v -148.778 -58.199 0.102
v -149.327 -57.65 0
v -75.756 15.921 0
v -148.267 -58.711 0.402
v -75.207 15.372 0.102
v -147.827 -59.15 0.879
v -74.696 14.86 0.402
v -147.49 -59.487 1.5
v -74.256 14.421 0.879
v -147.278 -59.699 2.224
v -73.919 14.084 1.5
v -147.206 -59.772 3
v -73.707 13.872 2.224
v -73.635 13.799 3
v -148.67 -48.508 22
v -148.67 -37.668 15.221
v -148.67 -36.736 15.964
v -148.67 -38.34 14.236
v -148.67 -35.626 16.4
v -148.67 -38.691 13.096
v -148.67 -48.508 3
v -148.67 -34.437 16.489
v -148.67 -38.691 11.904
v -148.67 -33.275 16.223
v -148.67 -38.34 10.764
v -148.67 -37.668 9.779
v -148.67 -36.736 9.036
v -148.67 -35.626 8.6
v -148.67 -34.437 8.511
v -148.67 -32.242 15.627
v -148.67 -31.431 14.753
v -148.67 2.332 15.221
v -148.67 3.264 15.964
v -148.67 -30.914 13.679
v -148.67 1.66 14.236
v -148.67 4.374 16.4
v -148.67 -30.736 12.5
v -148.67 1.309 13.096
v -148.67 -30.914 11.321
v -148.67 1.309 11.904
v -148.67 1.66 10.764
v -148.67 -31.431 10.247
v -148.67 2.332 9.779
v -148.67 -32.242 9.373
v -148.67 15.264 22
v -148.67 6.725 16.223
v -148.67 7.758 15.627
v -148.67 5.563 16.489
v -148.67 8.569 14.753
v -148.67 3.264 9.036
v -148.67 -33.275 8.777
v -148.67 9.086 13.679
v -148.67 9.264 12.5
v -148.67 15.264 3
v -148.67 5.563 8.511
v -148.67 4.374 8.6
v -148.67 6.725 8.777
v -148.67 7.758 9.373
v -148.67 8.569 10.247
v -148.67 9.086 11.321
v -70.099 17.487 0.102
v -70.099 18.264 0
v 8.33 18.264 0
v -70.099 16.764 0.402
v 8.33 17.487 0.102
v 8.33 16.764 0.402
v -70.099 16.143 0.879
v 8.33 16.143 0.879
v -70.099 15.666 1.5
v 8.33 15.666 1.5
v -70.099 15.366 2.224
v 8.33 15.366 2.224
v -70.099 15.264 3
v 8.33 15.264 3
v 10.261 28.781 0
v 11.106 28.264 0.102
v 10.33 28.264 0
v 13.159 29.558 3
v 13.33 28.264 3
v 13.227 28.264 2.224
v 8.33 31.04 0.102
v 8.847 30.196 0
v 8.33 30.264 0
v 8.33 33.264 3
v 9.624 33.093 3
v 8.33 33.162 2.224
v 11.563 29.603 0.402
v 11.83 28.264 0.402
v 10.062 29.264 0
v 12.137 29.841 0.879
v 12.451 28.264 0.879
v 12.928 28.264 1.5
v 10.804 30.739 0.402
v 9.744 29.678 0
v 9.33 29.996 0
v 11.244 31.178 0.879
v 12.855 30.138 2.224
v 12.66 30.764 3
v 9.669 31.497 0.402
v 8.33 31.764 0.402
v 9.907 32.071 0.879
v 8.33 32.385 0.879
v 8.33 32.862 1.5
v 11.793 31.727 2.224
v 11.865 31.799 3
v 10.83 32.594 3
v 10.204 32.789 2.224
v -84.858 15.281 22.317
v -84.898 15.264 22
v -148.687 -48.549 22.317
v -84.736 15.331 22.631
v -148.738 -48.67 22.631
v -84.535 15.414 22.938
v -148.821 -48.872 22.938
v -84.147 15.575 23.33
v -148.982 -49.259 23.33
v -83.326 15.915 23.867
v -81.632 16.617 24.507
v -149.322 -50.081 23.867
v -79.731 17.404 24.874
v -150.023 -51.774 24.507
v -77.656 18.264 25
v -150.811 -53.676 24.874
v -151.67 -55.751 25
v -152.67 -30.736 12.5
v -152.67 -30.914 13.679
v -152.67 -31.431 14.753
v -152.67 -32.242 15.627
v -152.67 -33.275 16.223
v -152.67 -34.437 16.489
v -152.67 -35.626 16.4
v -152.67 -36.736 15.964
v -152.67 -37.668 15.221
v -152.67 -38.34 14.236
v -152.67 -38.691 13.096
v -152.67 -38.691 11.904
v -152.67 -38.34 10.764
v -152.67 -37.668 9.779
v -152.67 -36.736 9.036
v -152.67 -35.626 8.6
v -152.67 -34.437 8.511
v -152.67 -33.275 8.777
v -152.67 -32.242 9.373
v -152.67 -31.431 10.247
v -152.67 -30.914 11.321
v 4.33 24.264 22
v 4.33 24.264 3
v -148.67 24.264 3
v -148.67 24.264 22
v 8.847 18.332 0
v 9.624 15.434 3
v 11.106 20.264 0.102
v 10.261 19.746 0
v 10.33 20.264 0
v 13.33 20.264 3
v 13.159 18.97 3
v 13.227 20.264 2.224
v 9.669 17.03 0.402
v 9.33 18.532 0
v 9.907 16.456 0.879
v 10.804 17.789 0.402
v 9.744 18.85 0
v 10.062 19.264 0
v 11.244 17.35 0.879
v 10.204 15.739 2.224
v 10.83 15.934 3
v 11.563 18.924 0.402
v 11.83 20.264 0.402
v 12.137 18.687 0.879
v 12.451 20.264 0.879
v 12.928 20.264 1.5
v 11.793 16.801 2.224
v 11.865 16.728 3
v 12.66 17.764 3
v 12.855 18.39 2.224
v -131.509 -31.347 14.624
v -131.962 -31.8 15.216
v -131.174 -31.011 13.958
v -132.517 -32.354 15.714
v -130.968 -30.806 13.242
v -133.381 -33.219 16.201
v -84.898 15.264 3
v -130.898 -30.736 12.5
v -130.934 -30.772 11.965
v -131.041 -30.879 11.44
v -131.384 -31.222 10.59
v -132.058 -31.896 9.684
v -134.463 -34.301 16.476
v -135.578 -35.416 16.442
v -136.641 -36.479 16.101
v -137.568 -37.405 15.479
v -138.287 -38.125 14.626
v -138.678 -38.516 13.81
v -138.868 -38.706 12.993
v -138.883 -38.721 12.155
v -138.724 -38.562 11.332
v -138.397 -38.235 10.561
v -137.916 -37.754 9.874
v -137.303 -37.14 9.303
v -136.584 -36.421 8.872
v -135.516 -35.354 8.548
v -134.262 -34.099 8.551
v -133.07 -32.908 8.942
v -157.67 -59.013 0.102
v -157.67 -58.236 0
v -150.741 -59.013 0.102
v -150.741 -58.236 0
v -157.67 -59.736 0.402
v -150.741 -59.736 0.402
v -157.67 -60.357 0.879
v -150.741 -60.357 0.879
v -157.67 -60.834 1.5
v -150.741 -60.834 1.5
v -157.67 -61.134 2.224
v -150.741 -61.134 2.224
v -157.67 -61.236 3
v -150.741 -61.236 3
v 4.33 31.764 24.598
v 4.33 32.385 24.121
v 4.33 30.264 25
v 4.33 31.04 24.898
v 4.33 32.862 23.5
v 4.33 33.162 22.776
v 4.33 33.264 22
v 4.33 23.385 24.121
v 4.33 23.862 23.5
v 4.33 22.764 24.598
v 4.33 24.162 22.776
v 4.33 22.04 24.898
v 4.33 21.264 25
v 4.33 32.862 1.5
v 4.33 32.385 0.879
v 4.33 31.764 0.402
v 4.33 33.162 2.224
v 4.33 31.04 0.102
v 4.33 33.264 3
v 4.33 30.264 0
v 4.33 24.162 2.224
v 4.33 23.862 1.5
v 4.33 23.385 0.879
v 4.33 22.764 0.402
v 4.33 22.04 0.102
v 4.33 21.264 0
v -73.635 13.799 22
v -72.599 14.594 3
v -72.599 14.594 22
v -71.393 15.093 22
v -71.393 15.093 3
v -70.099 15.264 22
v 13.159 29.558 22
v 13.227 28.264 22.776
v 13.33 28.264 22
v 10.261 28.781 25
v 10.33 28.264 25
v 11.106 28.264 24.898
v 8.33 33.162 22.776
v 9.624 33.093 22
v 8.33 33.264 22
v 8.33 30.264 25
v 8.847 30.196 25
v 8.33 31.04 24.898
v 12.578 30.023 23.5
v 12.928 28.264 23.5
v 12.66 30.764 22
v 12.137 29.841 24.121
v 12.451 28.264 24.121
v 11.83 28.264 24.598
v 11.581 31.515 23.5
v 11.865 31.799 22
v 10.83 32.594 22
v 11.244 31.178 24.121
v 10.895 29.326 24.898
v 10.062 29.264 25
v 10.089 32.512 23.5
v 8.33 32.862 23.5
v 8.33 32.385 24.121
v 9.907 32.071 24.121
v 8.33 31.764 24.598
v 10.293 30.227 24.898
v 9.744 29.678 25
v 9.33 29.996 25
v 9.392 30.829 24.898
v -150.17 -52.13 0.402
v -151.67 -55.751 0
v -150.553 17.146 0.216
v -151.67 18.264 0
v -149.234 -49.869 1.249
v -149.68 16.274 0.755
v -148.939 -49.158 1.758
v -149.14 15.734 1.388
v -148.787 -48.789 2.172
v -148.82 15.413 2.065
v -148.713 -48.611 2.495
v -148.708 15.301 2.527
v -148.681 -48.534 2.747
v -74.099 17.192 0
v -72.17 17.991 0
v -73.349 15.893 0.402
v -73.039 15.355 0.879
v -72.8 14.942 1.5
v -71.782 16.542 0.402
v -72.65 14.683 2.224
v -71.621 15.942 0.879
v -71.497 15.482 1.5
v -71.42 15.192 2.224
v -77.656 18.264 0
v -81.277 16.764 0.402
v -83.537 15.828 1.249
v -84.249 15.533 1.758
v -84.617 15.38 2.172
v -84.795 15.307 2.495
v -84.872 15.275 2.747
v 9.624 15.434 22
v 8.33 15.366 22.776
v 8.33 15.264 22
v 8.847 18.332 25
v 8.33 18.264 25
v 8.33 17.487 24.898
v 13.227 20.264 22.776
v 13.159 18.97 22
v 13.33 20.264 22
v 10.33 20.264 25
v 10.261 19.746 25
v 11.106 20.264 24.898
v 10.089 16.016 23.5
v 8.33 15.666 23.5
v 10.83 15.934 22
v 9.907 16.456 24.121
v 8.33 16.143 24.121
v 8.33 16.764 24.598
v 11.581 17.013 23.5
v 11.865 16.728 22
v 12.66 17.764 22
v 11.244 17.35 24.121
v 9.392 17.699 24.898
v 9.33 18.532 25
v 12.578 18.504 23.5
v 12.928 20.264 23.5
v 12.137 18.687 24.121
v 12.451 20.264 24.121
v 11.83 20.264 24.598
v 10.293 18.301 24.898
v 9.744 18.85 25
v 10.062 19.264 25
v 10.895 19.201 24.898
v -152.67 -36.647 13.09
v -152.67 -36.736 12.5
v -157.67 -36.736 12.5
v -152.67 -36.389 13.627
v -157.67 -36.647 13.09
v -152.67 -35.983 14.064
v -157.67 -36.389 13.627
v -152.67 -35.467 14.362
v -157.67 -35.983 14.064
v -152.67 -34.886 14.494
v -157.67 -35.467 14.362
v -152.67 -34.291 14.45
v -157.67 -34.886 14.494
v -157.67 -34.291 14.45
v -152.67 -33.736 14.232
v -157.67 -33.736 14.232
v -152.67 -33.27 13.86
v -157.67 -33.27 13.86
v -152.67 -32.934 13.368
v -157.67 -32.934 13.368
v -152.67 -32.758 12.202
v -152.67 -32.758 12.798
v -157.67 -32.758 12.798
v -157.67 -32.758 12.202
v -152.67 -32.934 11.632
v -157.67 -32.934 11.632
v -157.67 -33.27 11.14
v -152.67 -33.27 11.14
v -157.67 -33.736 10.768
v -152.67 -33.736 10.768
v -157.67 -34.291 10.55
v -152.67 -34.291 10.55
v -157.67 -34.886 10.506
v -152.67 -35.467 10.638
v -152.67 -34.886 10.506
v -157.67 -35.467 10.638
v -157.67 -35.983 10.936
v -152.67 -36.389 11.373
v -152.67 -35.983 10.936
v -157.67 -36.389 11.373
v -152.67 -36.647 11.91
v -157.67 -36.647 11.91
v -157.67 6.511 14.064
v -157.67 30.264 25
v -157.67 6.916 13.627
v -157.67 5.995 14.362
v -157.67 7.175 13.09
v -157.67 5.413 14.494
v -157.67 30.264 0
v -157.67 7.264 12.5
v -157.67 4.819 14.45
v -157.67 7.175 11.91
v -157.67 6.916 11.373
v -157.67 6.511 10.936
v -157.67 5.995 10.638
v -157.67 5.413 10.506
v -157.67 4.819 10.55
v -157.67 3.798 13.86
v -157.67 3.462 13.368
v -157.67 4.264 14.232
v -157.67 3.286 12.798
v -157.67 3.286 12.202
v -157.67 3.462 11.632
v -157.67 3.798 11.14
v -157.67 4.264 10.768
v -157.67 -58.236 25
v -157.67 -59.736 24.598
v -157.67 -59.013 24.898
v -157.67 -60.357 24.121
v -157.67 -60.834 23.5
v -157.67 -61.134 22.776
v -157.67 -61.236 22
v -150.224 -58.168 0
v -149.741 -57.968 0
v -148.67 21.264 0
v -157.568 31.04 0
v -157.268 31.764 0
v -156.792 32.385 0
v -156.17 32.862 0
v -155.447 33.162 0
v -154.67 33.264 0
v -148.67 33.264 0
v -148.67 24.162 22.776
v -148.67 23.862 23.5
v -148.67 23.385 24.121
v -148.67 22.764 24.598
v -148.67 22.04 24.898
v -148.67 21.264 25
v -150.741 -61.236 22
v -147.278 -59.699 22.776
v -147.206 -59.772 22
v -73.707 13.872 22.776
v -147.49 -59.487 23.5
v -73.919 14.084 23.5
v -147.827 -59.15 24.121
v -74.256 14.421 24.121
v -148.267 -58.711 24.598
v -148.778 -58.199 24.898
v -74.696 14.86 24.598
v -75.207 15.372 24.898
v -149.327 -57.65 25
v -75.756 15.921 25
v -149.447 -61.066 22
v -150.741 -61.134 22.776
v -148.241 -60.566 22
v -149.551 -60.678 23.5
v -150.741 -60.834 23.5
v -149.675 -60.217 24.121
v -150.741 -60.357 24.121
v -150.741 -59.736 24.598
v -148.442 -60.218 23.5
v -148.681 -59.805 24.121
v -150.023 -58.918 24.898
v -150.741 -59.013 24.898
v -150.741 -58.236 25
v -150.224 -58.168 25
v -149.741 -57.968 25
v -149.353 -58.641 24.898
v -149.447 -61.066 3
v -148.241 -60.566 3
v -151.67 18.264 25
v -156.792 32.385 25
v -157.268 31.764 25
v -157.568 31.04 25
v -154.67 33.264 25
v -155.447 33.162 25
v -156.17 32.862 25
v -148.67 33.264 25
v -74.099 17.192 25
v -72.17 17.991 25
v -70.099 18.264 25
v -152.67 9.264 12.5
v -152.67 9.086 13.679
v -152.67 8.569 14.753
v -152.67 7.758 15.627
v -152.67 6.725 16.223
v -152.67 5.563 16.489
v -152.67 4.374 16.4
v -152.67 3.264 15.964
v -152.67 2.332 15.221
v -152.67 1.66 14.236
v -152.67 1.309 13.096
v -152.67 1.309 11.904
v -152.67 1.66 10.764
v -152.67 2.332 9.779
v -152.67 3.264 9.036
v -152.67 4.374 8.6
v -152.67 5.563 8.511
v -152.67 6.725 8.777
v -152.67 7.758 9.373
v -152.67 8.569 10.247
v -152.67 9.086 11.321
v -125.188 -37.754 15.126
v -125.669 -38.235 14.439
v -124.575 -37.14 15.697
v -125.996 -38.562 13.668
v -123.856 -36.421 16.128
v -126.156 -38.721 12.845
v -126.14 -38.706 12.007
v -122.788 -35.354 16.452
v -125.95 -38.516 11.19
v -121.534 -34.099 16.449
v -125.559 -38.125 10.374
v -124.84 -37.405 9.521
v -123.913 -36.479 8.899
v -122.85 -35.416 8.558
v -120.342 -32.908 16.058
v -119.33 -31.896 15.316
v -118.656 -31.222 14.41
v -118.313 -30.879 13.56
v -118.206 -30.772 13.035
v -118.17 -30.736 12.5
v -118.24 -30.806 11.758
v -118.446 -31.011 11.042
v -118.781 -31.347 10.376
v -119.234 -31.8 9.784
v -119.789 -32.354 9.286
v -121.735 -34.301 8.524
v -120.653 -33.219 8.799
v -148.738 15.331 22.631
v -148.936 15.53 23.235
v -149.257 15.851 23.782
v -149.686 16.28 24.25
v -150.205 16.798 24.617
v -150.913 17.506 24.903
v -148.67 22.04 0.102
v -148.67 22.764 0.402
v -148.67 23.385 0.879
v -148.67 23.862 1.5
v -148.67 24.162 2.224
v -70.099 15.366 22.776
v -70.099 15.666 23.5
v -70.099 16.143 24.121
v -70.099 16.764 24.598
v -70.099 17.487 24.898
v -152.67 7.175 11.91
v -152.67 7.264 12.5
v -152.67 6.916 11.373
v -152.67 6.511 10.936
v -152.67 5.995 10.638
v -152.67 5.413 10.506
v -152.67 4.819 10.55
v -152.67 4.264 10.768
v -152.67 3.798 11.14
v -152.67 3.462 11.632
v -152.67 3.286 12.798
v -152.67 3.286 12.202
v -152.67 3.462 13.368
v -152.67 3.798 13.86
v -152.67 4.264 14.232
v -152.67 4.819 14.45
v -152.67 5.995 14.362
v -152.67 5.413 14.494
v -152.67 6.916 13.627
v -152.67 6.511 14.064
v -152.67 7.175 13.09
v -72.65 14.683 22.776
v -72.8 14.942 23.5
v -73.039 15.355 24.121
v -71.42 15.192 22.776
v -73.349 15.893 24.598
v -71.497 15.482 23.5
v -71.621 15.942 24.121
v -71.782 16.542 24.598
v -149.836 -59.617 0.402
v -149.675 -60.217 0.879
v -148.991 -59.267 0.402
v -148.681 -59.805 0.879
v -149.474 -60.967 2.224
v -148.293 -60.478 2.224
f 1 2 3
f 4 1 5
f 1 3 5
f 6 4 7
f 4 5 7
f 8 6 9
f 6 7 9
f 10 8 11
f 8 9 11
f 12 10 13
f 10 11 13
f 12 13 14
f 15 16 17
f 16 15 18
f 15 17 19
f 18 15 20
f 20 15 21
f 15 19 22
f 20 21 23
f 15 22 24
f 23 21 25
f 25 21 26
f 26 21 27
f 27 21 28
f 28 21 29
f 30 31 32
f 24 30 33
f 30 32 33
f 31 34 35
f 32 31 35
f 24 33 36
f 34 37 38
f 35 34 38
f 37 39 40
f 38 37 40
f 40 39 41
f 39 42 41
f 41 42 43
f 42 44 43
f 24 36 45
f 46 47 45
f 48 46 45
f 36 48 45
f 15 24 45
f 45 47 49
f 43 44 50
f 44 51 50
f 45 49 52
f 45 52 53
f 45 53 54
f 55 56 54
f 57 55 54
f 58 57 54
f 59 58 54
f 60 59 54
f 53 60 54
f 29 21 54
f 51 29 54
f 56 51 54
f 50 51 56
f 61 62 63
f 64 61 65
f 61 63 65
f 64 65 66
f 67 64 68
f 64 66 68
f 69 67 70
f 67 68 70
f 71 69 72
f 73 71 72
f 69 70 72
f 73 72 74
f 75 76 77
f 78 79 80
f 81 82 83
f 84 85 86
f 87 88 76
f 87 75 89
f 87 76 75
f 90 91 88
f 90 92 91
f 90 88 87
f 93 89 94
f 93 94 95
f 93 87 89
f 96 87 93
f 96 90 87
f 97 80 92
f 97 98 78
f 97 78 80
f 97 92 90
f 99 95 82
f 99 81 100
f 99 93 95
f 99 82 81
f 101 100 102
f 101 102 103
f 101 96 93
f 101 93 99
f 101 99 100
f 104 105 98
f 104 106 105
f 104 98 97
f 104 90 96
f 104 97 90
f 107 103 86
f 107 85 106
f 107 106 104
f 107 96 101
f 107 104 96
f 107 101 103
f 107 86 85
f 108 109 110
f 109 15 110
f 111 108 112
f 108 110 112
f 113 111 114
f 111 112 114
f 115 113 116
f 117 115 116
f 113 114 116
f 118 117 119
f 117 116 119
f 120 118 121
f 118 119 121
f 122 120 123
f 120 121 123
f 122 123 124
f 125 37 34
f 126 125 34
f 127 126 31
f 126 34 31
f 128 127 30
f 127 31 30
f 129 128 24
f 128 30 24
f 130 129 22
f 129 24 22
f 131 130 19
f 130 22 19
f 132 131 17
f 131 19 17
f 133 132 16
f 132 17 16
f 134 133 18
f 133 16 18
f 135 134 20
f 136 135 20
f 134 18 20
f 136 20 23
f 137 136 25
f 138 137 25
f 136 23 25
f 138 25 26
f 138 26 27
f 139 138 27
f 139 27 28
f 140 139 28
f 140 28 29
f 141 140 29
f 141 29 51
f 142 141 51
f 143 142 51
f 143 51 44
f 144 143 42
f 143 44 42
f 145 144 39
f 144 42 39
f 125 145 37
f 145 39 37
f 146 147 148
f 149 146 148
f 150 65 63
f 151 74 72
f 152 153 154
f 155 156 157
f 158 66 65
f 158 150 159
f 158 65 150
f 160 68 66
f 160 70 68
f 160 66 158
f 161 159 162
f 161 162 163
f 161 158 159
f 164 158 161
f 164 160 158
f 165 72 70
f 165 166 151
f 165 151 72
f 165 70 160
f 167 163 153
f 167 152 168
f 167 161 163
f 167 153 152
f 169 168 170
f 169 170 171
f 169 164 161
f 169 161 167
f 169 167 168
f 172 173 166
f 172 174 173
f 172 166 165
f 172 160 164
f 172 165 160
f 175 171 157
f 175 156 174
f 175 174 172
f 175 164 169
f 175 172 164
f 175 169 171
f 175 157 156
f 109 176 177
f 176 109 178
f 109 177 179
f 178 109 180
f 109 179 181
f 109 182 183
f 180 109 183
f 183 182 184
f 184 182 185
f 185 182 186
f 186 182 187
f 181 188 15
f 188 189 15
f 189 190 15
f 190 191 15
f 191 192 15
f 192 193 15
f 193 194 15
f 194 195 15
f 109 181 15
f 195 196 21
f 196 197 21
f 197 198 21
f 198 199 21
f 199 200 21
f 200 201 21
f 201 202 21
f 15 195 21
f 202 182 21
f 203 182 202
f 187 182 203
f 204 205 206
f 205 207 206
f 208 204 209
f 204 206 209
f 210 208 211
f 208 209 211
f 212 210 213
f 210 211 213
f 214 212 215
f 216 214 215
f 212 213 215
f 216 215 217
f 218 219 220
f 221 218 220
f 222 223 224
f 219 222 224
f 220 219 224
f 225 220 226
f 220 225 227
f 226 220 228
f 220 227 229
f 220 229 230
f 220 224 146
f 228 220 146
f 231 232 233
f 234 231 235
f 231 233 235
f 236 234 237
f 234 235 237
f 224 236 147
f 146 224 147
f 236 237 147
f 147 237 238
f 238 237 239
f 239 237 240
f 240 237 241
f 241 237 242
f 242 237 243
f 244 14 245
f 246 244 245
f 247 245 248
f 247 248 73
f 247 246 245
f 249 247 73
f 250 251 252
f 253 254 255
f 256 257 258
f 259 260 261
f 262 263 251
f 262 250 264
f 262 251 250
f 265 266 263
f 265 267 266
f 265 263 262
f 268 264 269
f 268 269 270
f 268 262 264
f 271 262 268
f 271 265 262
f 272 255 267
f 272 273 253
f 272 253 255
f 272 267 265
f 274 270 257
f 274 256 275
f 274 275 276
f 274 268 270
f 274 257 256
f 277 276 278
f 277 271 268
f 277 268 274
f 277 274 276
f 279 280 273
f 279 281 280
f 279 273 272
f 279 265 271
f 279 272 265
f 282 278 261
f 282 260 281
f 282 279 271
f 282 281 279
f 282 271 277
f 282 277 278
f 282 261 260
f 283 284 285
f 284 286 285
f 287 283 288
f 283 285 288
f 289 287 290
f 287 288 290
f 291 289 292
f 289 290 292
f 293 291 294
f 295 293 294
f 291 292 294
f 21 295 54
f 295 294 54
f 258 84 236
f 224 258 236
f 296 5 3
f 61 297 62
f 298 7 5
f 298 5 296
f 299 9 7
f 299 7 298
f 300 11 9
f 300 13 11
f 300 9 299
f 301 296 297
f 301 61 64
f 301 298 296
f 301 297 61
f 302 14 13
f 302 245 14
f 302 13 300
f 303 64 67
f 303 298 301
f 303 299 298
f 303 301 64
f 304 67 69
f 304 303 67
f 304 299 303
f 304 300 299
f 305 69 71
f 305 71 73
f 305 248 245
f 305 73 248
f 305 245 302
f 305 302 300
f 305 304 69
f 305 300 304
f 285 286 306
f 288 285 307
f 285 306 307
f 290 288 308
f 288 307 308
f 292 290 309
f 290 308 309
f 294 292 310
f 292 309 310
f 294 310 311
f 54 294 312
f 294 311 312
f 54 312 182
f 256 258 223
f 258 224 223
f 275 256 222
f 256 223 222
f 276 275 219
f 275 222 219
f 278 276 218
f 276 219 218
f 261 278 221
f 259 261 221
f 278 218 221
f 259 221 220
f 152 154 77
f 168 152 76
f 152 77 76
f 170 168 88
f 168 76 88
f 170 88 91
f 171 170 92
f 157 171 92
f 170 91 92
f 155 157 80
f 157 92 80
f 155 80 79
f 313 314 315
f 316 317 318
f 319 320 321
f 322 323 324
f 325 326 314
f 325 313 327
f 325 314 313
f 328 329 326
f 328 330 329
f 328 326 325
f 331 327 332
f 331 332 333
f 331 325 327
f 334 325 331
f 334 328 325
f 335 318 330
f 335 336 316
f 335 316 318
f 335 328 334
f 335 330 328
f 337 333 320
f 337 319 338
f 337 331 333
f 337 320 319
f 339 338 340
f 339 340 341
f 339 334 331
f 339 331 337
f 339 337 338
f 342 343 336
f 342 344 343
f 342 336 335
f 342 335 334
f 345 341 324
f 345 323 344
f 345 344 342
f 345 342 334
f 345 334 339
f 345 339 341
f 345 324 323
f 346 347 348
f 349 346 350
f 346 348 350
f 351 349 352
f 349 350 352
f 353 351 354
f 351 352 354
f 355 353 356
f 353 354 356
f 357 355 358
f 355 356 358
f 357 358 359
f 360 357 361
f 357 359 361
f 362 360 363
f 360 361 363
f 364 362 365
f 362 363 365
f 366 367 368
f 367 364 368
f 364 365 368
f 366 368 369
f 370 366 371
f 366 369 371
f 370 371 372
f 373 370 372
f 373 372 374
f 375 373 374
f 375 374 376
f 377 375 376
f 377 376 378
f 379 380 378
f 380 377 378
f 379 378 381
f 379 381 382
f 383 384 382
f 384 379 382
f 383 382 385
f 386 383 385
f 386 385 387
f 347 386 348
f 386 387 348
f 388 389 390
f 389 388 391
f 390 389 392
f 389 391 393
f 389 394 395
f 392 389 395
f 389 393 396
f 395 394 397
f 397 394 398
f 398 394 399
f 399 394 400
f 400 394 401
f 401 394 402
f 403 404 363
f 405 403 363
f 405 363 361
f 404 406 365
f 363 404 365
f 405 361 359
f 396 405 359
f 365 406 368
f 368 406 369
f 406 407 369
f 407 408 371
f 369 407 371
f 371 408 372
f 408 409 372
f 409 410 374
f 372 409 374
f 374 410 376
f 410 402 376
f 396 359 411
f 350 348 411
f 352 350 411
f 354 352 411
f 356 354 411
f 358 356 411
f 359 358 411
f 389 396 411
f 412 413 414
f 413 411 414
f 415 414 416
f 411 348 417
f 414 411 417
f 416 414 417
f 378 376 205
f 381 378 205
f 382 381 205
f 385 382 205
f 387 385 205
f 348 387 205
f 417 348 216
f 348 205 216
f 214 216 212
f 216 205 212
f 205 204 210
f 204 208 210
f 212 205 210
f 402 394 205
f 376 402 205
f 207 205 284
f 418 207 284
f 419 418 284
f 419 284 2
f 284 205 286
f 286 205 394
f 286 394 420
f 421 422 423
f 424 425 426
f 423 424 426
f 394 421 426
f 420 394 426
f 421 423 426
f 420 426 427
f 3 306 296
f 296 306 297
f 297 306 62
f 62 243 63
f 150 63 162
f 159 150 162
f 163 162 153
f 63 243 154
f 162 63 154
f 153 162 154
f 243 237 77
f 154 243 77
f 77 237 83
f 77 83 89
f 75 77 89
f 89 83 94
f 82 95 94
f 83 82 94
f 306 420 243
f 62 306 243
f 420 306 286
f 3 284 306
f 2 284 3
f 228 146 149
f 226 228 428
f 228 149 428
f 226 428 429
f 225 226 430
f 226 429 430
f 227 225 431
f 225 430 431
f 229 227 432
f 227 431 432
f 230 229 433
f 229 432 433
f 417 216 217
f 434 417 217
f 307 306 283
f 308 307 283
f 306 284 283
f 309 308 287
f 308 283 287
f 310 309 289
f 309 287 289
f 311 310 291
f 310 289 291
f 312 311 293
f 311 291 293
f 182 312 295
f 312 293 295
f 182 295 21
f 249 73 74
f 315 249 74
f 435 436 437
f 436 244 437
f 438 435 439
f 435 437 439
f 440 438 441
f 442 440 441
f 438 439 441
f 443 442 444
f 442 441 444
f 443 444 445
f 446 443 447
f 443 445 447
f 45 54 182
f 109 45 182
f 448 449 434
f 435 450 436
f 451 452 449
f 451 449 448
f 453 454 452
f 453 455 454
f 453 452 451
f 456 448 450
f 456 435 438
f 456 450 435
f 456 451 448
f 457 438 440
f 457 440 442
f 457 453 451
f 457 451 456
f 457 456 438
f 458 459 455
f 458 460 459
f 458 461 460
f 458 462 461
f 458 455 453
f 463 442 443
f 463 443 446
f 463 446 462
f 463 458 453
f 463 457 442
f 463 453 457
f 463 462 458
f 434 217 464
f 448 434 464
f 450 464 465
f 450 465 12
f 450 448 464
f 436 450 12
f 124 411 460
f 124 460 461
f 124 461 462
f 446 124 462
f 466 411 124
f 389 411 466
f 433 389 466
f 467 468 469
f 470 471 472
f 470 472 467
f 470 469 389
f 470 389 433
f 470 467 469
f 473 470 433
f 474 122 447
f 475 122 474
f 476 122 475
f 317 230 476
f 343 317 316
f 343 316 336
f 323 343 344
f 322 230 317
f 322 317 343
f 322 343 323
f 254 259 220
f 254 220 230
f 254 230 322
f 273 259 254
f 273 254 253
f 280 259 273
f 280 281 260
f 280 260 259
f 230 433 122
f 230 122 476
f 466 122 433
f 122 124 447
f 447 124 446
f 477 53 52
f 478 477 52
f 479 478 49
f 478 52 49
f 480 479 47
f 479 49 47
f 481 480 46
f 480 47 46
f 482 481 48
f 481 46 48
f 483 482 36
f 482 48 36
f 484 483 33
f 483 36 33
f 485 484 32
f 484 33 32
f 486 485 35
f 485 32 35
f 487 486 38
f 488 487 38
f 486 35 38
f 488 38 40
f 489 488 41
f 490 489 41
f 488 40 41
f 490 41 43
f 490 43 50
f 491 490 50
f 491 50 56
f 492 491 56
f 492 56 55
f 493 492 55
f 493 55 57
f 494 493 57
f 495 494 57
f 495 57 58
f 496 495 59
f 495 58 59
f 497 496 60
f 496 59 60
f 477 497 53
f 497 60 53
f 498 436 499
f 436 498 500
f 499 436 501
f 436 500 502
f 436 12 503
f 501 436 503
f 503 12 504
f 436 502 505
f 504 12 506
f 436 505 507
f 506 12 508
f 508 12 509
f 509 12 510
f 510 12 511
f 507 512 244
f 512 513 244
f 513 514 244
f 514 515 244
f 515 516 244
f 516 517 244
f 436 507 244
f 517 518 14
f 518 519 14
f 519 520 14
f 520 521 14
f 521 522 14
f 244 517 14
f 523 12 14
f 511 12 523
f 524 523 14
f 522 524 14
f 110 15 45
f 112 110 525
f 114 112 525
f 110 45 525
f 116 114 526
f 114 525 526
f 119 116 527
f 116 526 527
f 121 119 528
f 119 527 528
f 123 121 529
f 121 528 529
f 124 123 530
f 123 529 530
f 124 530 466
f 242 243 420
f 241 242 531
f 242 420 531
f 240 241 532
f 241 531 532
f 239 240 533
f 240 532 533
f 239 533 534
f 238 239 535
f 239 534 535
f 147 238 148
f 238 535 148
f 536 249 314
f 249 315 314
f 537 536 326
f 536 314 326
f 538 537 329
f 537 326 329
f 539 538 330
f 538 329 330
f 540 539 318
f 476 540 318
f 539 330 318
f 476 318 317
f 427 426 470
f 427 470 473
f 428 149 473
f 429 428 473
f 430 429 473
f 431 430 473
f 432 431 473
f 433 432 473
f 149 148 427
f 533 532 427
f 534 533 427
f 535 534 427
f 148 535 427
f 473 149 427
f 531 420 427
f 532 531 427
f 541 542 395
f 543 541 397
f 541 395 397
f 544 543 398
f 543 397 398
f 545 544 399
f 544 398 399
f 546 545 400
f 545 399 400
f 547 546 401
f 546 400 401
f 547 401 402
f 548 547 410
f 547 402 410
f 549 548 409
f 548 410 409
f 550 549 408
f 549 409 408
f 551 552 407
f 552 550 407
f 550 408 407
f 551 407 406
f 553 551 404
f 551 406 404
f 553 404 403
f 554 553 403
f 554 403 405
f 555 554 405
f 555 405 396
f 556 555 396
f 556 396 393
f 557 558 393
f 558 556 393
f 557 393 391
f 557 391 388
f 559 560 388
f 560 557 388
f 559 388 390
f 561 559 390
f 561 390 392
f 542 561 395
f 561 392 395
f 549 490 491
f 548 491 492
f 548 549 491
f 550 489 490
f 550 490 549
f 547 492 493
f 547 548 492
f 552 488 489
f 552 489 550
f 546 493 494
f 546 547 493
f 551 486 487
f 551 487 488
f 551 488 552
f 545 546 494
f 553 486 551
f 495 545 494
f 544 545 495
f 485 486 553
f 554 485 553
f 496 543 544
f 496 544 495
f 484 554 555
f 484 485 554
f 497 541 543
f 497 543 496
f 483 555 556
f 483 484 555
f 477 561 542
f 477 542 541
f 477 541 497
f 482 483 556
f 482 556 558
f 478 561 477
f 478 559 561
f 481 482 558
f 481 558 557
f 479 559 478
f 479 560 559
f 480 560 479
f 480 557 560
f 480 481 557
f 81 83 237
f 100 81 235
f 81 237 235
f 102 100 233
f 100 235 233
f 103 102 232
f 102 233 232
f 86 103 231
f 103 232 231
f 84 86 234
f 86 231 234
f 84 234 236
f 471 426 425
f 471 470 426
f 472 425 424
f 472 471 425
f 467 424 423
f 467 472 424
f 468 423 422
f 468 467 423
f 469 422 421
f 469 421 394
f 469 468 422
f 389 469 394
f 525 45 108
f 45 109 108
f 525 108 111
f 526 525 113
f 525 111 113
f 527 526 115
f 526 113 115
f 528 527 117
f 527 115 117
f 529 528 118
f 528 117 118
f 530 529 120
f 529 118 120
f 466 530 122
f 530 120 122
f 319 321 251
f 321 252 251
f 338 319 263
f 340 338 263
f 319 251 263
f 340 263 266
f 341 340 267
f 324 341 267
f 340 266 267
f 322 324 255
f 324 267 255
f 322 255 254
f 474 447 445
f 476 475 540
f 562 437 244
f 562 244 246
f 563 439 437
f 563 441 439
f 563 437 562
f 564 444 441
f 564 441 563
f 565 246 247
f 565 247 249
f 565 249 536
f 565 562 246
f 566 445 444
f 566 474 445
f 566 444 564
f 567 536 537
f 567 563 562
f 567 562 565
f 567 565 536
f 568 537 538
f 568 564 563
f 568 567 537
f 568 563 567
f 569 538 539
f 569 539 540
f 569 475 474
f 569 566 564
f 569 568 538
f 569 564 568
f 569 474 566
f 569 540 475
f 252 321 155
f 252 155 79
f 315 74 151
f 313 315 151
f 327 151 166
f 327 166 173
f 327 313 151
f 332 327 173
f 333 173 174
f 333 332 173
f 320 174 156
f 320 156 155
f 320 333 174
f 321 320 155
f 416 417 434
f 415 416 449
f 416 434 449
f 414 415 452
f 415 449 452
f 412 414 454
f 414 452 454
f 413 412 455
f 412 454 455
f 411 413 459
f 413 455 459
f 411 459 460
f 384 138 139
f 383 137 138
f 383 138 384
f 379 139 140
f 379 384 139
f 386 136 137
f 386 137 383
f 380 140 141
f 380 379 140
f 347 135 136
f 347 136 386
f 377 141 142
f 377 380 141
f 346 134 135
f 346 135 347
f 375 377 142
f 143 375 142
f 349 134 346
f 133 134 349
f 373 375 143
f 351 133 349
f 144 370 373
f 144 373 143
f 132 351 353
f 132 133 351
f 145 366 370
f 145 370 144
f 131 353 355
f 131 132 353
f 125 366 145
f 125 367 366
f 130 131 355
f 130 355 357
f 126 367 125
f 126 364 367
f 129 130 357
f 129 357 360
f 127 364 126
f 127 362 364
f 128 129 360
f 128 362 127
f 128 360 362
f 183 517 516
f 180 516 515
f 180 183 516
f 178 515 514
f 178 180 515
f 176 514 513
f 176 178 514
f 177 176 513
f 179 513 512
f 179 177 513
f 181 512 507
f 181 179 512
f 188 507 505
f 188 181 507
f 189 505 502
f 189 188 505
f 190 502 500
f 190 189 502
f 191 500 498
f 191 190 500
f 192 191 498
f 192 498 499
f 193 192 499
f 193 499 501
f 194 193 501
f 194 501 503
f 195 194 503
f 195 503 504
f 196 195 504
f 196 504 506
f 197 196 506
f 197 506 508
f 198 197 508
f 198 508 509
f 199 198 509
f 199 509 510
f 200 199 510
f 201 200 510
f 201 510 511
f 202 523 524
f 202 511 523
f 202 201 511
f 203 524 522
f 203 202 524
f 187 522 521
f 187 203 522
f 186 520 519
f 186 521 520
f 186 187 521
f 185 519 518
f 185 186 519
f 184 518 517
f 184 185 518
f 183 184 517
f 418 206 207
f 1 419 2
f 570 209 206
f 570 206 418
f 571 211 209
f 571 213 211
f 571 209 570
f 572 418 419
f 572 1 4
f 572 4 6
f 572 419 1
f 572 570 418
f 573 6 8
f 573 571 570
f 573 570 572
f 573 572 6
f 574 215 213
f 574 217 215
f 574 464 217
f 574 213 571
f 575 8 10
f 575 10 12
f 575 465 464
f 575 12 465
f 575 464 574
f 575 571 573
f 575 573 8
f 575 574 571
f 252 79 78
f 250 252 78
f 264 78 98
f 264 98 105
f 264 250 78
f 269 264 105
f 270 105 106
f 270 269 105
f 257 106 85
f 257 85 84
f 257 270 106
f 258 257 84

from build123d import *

# Parameters (mm, degrees)
F0_W     = 9
F0_H     = 9
F1_DEPTH = 25
F3_DEPTH = 9
F4_R     = 4
F4_R_2   = 2
F5_DEPTH = 4
F6_DEPTH = 162.001
F7_R     = 5
F8_R     = 5
F9_R     = 5
F10_R    = 5
F11_R    = 3
F12_R    = 3


with BuildPart() as f1:
    # F0 (on Top) → F1 (new body)
    with BuildSketch(Plane.XY):
        Polygon((-148.6704205513, 24.2638568878), (-148.6704205513, 15.2638568878), (-84.8983426127, 15.2638568878), (-72.1704205513, 15.2638568878), (4.3295794487, 15.2638568878), (4.3295794487, 24.2638568878), align=None)
        with Locations((-153.1704205513, 19.7638568878)):
            Rectangle(F0_W, F0_H)
        Polygon((-148.6704205513, -48.5082210508), (-148.6704205513, 15.2638568878), (-157.6704205513, 15.2638568878), (-157.6704205513, -61.2361431122), (-148.6704205513, -61.2361431122), align=None)
        Polygon((-72.1704205513, 15.2638568878), (-84.8983426127, 15.2638568878), (-116.784381582, -16.6221820815), (-110.4204205513, -22.9861431122), align=None)
        with Locations((-153.1704205513, 28.7638568878)):
            Rectangle(F0_W, F0_H)
        Polygon((-116.784381582, -16.6221820815), (-148.6704205513, -48.5082210508), (-148.6704205513, -61.2361431122), (-110.4204205513, -22.9861431122), align=None)
        Polygon((4.3295794487, 33.2638568878), (4.3295794487, 24.2638568878), (4.3295794487, 15.2638568878), (13.3295794487, 15.2638568878), (13.3295794487, 33.2638568878), align=None)
    extrude(amount=F1_DEPTH)

    # F2 (on face) → F3 (cut, through all)
    with BuildSketch(Plane(origin=(-157.6704205513, 0, 0), x_dir=(0, -1, 0), z_dir=(-1, 0, 0))):
        with BuildLine():
            ThreePointArc((-3.2638568878, 12.5), (-5.2638568878, 14.5), (-7.2638568878, 12.5))
            Line((-7.2638568878, 12.5), (-3.2638568878, 12.5))
        make_face()
        with BuildLine():
            Line((-3.2638568878, 12.5), (-7.2638568878, 12.5))
            ThreePointArc((-7.2638568878, 12.5), (-5.2638568878, 10.5), (-3.2638568878, 12.5))
        make_face()
        with BuildLine():
            ThreePointArc((32.7361431122, 12.5), (34.7361431122, 10.5), (36.7361431122, 12.5))
            Line((36.7361431122, 12.5), (32.7361431122, 12.5))
        make_face()
        with BuildLine():
            Line((32.7361431122, 12.5), (36.7361431122, 12.5))
            ThreePointArc((36.7361431122, 12.5), (34.7361431122, 14.5), (32.7361431122, 12.5))
        make_face()
    extrude(amount=-F3_DEPTH, mode=Mode.SUBTRACT)

    # F4 (on face) → F5 (cut)
    with BuildSketch(Plane.YZ.offset(-148.6704205513)):
        with Locations((5.2638568876, 12.5)):
            Circle(F4_R)
        with Locations((5.2638568878, 12.5)):
            Circle(F4_R_2, mode=Mode.SUBTRACT)
        with Locations((-34.7361431124, 12.5)):
            Circle(F4_R)
        with Locations((-34.7361431122, 12.5)):
            Circle(F4_R_2, mode=Mode.SUBTRACT)
    extrude(amount=-F5_DEPTH, mode=Mode.SUBTRACT)

    # F4 (on face) → F6 (cut, through all)
    with BuildSketch(Plane.YZ.offset(-148.6704205513)):
        with Locations((-34.7361431124, 12.5)):
            Circle(F4_R)
        with Locations((-34.7361431122, 12.5)):
            Circle(F4_R_2, mode=Mode.SUBTRACT)
        with Locations((-34.7361431122, 12.5)):
            Circle(F4_R_2)
    extrude(amount=F6_DEPTH, mode=Mode.SUBTRACT)

    # F7
    f7_edges = [f1.edges().sort_by_distance(p)[0] for p in [
        (-148.670421, -61.236143, 12.5),
    ]]
    fillet(f7_edges, radius=F7_R)

    # F8
    f8_edges = [f1.edges().sort_by_distance(p)[0] for p in [
        (-72.170421, 15.263857, 12.5),
    ]]
    fillet(f8_edges, radius=F8_R)

    # F9
    f9_edges = [f1.edges().sort_by_distance(p)[0] for p in [
        (13.329579, 15.263857, 12.5),
    ]]
    fillet(f9_edges, radius=F9_R)

    # F10
    f10_edges = [f1.edges().sort_by_distance(p)[0] for p in [
        (13.329579, 33.263857, 12.5),
    ]]
    fillet(f10_edges, radius=F10_R)

    # F11
    f11_edges = [f1.edges().sort_by_distance(p)[0] for p in [
        (-157.670421, 33.263857, 12.5),
        (-116.784382, 15.263857, 25),
        (-30.884887, 15.263857, 25),
        (-116.784382, -16.622182, 25),
        (-148.670421, -16.622182, 25),
        (-72.170421, 24.263857, 25),
    ]]
    fillet(f11_edges, radius=F11_R)

    # F12
    f12_edges = [f1.edges().sort_by_distance(p)[0] for p in [
        (-116.784382, 15.263857, 0),
        (-30.884887, 15.263857, 0),
        (-110.420421, -22.986143, 0),
        (-116.784382, -16.622182, 0),
        (-148.670421, -16.622182, 0),
        (-72.170421, 24.263857, 0),
    ]]
    fillet(f12_edges, radius=F12_R)


solid = f1.part
